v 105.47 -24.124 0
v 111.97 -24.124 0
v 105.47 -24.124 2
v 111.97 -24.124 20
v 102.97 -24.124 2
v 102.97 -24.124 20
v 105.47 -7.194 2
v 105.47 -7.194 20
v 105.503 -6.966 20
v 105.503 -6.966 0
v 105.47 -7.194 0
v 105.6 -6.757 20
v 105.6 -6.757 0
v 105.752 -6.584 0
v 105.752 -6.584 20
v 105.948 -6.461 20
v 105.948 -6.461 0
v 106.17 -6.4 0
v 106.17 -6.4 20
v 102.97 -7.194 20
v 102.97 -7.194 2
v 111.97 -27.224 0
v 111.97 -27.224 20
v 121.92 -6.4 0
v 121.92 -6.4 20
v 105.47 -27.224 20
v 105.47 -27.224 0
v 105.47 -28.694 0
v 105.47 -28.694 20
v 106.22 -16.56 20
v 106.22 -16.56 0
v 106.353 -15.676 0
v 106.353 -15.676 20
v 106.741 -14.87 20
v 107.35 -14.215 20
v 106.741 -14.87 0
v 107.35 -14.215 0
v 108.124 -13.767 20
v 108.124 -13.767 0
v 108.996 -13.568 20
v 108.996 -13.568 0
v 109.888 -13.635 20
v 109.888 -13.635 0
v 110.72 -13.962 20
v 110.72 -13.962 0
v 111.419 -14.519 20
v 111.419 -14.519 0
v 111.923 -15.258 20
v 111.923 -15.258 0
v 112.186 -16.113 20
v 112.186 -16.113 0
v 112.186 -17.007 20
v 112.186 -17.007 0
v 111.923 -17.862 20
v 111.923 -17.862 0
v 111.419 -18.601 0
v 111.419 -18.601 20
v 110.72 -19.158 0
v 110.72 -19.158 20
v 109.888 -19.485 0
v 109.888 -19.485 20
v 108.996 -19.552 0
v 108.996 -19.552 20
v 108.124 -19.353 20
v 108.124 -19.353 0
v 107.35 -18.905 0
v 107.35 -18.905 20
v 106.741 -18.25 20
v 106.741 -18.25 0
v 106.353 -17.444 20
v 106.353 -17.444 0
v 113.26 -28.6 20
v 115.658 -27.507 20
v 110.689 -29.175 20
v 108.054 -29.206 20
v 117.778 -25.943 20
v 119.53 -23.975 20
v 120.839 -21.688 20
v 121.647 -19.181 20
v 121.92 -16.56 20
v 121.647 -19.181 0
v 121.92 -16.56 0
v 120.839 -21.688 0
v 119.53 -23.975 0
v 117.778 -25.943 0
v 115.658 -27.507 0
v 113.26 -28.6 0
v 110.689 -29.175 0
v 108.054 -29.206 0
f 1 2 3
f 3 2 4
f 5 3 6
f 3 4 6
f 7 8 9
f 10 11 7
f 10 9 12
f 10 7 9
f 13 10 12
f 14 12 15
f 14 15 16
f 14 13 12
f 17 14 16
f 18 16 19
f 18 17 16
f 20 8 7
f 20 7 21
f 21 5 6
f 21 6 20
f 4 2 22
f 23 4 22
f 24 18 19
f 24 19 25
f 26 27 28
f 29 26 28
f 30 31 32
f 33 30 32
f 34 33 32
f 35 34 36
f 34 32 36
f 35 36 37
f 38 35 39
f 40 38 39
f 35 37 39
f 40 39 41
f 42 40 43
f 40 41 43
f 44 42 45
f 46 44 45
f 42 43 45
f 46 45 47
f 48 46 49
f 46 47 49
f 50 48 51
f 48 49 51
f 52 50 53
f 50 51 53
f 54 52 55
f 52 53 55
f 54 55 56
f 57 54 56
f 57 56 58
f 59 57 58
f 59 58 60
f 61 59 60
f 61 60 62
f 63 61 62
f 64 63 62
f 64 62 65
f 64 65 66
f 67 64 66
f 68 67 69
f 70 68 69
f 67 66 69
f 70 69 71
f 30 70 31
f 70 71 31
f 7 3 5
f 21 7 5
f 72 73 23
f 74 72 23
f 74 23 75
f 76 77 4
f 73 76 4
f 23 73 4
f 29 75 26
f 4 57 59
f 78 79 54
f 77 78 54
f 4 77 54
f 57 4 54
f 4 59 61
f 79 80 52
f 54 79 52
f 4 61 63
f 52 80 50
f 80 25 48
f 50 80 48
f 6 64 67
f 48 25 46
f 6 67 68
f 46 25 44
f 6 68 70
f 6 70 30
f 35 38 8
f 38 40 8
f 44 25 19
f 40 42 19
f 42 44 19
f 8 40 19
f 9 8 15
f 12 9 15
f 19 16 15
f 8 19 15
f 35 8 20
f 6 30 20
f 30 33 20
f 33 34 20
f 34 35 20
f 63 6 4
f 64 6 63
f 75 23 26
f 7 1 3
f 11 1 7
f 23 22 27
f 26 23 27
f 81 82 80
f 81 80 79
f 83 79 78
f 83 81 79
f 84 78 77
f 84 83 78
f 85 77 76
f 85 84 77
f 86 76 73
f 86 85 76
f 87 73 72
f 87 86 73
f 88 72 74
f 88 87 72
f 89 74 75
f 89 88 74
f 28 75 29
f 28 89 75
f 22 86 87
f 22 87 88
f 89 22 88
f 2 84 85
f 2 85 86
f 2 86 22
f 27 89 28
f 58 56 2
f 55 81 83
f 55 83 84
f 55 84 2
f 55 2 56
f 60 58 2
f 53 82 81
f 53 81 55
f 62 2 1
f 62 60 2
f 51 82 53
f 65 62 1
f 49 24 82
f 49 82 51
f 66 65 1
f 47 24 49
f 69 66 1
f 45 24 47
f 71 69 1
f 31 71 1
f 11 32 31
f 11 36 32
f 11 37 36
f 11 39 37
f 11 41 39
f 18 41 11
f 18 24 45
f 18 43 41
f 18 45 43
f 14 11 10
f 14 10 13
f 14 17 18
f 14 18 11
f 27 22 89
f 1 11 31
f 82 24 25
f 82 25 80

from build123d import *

# Parameters (mm, degrees)
SKETCH016_R  = 3
PAD017_DEPTH = 20
SKETCH020_W  = 2.5
SKETCH020_H  = 16.93
PAD021_DEPTH = 18


with BuildPart() as corner_fl005:
    # Sketch016 → Pad017 (new body)
    with BuildSketch(Plane.XY):
        with BuildLine():
            ThreePointArc((-121.92, -35.56), (-116.758725, -45.780451), (-105.46998, -47.693728))
            Line((-105.46998, -46.223728), (-105.46998, -47.693728))
            Line((-111.96998, -46.223728), (-105.46998, -46.223728))
            Line((-111.96998, -43.123728), (-111.96998, -46.223728))
            Line((-105.46998, -43.123728), (-111.96998, -43.123728))
            Line((-105.46998, -31.693728), (-105.46998, -43.123728))
            Line((-105.46998, -31.693728), (-105.46998, -26.193728))
            ThreePointArc((-105.46998, -26.193728), (-105.669987, -25.66457), (-106.17, -25.4))
            Line((-106.17, -25.4), (-121.92, -25.4))
            Line((-121.92, -25.4), (-121.92, -35.56))
        make_face()
        with Locations((-109.22, -35.56)):
            Circle(SKETCH016_R, mode=Mode.SUBTRACT)
    extrude(amount=PAD017_DEPTH)

    # Sketch020 (on Face13 of Pad017) → Pad021 (join)
    with BuildSketch(Plane.XY.offset(20)):
        with Locations((-104.21998, -34.658728)):
            Rectangle(SKETCH020_W, SKETCH020_H)
    extrude(amount=-PAD021_DEPTH)


with BuildPart() as corner_fl005_1:
    # Body012 placement: moved
    add(corner_fl005.part.moved(Location((0, 19, 0))))


with BuildPart() as corner_fl005_mirrored:
    # mirror: instance of Corner_FL005
    add(corner_fl005_1.part.mirror(Plane(origin=(0, 0, 0), x_dir=(0, -1, 0), z_dir=(1, 0, 0))))


solid = corner_fl005_mirrored.part
